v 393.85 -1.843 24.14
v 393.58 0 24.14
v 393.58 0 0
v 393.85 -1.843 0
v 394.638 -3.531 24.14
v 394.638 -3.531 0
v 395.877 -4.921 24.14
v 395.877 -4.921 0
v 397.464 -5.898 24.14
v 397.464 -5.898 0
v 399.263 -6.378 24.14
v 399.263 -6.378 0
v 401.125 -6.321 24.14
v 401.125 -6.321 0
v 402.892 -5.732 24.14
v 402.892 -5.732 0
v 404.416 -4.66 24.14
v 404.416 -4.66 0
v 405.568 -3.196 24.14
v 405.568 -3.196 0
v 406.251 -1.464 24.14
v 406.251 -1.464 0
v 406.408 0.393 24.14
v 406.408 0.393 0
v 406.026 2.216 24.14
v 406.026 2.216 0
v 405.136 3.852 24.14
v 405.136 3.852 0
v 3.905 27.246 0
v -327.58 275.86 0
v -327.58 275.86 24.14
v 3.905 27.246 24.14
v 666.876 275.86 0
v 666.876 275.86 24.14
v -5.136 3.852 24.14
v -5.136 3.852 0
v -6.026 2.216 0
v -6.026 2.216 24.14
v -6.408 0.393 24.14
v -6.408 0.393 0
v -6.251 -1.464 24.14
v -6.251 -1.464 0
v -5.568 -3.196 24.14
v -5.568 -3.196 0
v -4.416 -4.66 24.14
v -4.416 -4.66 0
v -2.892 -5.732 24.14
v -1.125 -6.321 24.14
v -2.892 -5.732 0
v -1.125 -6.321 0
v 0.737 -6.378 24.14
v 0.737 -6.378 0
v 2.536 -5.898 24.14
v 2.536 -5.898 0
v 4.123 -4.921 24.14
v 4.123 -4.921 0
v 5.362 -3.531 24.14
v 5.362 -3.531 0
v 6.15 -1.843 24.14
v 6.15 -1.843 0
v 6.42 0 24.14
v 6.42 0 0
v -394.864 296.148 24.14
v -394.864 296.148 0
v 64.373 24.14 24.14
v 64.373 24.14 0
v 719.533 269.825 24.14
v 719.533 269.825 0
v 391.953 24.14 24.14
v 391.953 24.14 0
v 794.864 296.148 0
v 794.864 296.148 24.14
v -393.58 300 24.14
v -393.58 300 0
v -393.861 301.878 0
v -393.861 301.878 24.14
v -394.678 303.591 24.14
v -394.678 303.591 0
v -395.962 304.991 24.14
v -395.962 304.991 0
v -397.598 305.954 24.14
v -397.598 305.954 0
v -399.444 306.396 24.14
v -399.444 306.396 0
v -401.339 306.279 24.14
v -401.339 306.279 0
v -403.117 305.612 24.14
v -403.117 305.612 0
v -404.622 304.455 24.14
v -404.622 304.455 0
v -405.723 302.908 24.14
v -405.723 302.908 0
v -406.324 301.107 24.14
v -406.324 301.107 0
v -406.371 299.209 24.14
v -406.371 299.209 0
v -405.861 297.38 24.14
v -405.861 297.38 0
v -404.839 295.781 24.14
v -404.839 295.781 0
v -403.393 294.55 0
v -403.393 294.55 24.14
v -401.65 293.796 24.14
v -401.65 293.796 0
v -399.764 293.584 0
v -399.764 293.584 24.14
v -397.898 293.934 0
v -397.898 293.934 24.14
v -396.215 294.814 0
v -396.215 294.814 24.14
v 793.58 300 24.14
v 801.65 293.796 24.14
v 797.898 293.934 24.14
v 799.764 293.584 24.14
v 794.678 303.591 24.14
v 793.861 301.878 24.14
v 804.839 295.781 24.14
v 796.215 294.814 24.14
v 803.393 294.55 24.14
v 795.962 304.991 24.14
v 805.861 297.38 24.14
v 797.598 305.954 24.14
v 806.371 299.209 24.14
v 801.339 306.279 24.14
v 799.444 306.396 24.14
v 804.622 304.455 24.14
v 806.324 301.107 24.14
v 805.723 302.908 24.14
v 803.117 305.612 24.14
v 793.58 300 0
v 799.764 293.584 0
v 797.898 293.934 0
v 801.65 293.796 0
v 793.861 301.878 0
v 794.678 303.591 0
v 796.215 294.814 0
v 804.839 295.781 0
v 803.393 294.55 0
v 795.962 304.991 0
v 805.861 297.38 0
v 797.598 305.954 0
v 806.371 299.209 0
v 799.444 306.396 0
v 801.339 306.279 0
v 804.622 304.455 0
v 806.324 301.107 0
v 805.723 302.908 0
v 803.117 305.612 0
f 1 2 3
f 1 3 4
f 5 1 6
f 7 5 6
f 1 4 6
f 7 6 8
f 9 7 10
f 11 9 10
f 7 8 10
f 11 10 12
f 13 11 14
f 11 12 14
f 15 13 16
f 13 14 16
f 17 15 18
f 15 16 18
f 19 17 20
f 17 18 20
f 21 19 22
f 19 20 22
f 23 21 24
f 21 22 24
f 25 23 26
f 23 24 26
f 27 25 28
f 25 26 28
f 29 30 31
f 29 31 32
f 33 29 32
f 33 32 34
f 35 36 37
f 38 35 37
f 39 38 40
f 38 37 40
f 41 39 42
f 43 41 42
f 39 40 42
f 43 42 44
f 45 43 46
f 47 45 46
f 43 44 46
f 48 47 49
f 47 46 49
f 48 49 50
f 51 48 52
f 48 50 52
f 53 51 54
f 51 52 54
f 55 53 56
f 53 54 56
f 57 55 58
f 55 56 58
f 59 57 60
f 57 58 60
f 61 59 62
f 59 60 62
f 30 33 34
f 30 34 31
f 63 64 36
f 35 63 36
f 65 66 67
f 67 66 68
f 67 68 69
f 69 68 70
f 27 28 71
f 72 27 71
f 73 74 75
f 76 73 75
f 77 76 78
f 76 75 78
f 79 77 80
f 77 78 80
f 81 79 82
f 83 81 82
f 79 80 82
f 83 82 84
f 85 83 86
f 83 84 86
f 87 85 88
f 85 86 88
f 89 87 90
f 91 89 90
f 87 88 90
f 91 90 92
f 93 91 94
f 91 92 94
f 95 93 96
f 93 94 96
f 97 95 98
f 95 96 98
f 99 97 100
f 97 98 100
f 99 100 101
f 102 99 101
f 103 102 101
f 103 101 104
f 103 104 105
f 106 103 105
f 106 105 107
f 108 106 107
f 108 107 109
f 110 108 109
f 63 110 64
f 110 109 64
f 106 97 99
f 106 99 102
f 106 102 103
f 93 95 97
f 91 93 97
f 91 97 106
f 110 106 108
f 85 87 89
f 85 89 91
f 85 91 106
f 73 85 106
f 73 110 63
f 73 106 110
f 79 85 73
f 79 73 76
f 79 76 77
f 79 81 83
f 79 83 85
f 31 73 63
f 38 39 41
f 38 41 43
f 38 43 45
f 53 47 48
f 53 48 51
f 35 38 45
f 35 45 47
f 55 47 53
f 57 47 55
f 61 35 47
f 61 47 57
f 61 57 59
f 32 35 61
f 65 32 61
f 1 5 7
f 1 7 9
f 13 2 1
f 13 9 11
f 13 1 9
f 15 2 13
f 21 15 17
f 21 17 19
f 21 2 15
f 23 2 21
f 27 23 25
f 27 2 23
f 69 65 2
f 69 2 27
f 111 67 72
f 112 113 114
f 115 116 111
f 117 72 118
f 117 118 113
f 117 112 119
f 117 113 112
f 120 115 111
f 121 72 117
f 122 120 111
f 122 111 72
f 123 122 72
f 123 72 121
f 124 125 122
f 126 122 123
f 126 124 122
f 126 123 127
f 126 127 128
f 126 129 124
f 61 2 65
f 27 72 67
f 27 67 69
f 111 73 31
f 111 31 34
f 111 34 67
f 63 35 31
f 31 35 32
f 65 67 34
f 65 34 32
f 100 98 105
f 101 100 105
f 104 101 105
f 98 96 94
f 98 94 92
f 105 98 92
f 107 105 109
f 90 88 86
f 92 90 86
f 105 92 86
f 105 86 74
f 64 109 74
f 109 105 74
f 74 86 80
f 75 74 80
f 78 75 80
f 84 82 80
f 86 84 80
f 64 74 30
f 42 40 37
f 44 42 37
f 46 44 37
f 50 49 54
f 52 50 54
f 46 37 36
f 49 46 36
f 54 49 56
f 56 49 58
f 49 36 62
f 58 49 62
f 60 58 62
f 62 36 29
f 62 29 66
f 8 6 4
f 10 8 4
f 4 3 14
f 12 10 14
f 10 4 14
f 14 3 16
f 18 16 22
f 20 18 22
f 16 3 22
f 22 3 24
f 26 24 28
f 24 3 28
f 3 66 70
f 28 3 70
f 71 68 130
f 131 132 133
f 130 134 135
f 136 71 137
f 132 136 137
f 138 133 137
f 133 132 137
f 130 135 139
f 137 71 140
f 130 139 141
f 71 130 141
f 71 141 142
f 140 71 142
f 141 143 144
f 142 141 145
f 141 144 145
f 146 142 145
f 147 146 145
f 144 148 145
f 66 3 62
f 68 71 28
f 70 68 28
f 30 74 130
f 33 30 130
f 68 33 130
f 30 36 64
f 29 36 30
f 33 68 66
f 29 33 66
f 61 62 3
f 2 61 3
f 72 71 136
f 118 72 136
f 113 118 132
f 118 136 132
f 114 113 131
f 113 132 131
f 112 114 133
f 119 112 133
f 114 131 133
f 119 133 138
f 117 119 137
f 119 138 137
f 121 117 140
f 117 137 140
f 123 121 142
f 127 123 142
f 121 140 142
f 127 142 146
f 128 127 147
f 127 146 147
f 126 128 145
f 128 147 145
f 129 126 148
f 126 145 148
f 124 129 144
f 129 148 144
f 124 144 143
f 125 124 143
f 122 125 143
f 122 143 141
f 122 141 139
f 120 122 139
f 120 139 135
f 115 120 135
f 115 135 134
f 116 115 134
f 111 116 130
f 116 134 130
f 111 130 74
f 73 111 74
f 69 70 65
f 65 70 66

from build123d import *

# Parameters (mm, degrees)
BOSS_EXTRUDE1_DEPTH = 24.14


with BuildPart() as part:
    # Sketch3 → Boss-Extrude1 (new body)
    with BuildSketch(Plane.XY):
        with BuildLine():
            Line((6.42, 0), (393.58, 0))
            ThreePointArc((393.58, 0), (402.030182258, -6.090546773), (405.136, 3.852))
            Line((405.136, 3.852), (794.864, 296.148))
            ThreePointArc((794.864, 296.148), (806.090546773, 302.030182258), (793.58, 300))
            Line((793.58, 300), (-393.58, 300))
            ThreePointArc((-393.58, 300), (-406.090546773, 302.030182258), (-394.864, 296.148))
            Line((-394.864, 296.148), (-5.136, 3.852))
            ThreePointArc((-5.136, 3.852), (-2.030182258, -6.090546773), (6.42, 0))
        make_face()
        Polygon((64.373333333, 24.14), (719.533333333, 269.825), (391.953333333, 24.14), align=None, mode=Mode.SUBTRACT)
        Polygon((-327.58, 275.86), (3.90530551, 27.246020868), (666.875916529, 275.86), align=None, mode=Mode.SUBTRACT)
    extrude(amount=BOSS_EXTRUDE1_DEPTH)


solid = part.part
